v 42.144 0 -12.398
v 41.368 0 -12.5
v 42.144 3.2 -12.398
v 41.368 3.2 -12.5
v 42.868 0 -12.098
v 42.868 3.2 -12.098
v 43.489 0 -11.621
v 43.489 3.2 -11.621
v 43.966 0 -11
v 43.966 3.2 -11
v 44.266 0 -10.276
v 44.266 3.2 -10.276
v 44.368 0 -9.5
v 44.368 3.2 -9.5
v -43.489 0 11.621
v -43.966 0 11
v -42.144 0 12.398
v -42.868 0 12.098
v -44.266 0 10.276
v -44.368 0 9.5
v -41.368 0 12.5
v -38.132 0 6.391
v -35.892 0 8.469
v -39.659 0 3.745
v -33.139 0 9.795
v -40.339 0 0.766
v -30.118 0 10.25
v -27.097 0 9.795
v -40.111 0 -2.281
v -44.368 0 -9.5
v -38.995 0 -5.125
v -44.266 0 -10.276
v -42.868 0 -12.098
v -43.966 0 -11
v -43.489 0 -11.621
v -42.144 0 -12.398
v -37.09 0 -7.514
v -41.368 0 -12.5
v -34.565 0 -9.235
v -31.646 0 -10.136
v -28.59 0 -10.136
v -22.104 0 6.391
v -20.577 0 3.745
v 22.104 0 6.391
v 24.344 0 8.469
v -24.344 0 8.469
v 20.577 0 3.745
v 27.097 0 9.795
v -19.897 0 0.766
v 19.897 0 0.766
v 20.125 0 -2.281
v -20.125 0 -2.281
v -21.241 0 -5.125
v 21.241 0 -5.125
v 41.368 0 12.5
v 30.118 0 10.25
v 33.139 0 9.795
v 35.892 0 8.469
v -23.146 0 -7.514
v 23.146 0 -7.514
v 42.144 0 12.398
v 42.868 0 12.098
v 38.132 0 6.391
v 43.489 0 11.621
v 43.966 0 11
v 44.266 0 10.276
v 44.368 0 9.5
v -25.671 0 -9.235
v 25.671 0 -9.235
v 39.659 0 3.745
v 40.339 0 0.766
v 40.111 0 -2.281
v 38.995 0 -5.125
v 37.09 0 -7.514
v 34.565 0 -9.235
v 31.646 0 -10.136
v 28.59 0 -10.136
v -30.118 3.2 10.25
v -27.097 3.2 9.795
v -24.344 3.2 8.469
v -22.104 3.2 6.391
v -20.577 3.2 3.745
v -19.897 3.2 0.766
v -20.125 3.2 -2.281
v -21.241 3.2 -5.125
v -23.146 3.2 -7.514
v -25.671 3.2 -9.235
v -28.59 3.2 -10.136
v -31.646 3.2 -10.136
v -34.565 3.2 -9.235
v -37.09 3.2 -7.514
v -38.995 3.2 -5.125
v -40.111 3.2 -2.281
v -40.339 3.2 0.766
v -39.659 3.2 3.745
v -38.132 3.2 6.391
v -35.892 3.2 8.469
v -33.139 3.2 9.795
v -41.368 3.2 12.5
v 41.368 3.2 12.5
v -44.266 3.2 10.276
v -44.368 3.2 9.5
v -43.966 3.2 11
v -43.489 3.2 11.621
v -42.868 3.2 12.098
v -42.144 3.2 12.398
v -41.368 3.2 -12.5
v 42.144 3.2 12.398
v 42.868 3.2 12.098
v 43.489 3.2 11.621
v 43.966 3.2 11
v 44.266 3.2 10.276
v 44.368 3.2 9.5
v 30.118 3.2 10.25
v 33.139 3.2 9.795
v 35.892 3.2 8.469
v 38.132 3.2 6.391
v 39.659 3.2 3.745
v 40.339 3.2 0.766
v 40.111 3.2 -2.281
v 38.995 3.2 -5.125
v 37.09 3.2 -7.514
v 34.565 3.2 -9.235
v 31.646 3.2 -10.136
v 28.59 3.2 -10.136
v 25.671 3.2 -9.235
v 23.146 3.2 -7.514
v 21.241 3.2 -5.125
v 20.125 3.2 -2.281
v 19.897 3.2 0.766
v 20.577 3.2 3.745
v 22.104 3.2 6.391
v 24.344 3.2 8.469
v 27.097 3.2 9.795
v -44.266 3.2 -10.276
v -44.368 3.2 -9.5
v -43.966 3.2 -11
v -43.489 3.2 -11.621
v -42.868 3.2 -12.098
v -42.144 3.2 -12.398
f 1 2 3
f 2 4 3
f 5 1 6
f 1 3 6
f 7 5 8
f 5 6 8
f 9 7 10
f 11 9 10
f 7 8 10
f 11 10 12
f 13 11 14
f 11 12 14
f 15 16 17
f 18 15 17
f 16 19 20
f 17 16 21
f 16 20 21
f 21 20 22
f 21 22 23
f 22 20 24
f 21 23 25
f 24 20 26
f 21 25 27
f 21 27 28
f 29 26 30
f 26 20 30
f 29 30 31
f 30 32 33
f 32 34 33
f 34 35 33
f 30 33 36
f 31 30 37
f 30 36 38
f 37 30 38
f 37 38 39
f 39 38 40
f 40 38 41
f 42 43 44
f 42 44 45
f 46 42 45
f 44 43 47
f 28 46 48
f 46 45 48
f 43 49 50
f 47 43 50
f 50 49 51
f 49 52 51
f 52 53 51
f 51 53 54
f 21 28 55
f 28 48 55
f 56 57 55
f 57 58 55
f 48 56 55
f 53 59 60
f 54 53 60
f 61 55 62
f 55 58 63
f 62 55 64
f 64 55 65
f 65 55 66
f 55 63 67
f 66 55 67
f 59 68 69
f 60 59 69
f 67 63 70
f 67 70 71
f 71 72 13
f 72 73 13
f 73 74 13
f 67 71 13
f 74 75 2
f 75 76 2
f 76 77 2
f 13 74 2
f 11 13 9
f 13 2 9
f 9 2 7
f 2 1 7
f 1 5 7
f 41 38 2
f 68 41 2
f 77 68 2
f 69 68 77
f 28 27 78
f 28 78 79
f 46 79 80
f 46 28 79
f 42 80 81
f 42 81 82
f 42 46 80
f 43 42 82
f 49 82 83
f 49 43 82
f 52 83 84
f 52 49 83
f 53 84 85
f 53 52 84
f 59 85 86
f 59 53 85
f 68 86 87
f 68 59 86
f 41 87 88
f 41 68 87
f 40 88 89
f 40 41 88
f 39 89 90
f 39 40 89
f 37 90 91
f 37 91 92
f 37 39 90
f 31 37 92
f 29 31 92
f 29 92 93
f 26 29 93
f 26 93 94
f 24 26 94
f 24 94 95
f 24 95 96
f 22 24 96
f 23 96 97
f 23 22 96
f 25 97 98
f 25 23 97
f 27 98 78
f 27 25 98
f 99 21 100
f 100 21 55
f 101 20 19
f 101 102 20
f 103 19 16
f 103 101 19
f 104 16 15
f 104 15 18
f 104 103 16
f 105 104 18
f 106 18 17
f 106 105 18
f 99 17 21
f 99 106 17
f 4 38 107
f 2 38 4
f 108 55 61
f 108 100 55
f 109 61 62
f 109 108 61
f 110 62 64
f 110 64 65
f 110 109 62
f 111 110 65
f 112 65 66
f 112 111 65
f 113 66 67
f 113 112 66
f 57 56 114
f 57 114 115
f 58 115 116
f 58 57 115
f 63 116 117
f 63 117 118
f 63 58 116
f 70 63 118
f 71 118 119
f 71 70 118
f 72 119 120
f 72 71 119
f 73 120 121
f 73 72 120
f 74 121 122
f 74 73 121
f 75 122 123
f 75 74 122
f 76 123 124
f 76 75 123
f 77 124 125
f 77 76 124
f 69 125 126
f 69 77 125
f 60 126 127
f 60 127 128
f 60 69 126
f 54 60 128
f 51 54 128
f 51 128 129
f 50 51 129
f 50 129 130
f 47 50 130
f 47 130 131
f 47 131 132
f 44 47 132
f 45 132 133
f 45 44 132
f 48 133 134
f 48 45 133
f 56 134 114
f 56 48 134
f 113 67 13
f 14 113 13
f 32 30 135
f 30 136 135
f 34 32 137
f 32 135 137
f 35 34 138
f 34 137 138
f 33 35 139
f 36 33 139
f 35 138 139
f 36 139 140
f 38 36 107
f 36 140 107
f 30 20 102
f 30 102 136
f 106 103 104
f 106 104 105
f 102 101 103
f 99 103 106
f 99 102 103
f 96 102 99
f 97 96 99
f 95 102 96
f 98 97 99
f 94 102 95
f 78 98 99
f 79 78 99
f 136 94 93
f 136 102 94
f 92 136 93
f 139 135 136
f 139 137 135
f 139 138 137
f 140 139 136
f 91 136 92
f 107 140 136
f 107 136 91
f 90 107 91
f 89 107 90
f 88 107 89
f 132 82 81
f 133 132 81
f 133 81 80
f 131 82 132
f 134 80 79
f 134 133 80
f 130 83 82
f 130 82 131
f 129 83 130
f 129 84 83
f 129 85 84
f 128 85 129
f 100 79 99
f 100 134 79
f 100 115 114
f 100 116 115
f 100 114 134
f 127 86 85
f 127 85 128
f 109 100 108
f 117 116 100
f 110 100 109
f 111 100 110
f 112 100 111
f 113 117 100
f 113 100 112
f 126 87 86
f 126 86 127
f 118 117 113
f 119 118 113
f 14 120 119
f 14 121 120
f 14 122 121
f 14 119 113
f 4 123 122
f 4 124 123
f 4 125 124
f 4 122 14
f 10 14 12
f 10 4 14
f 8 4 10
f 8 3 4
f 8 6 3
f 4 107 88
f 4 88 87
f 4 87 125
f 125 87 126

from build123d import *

# Parameters (mm, degrees)
SKETCH1_W           = 88.736
SKETCH1_H           = 25
SKETCH1_R           = 10.25
BOSS_EXTRUDE1_DEPTH = 3.2
FILLET1_R           = 3


with BuildPart() as part:
    # Sketch1 → Boss-Extrude1 (new body)
    with BuildSketch(Plane(origin=(0, 0, 0), x_dir=(1, 0, 0), z_dir=(0, 1, 0))):
        Rectangle(SKETCH1_W, SKETCH1_H)
        with Locations(Location((30.118, 0, 0), (0, 0, 270))):
            Circle(SKETCH1_R, mode=Mode.SUBTRACT)
        with Locations(Location((-30.118, 0, 0), (0, 0, 270))):
            Circle(SKETCH1_R, mode=Mode.SUBTRACT)
    extrude(amount=BOSS_EXTRUDE1_DEPTH)

    # Fillet1
    fillet1_edges = [part.edges().sort_by_distance(p)[0] for p in [
        (44.368, 1.6, -12.5),
        (44.368, 1.6, 12.5),
        (-44.368, 1.6, 12.5),
        (-44.368, 1.6, -12.5),
    ]]
    fillet(fillet1_edges, radius=FILLET1_R)


solid = part.part
